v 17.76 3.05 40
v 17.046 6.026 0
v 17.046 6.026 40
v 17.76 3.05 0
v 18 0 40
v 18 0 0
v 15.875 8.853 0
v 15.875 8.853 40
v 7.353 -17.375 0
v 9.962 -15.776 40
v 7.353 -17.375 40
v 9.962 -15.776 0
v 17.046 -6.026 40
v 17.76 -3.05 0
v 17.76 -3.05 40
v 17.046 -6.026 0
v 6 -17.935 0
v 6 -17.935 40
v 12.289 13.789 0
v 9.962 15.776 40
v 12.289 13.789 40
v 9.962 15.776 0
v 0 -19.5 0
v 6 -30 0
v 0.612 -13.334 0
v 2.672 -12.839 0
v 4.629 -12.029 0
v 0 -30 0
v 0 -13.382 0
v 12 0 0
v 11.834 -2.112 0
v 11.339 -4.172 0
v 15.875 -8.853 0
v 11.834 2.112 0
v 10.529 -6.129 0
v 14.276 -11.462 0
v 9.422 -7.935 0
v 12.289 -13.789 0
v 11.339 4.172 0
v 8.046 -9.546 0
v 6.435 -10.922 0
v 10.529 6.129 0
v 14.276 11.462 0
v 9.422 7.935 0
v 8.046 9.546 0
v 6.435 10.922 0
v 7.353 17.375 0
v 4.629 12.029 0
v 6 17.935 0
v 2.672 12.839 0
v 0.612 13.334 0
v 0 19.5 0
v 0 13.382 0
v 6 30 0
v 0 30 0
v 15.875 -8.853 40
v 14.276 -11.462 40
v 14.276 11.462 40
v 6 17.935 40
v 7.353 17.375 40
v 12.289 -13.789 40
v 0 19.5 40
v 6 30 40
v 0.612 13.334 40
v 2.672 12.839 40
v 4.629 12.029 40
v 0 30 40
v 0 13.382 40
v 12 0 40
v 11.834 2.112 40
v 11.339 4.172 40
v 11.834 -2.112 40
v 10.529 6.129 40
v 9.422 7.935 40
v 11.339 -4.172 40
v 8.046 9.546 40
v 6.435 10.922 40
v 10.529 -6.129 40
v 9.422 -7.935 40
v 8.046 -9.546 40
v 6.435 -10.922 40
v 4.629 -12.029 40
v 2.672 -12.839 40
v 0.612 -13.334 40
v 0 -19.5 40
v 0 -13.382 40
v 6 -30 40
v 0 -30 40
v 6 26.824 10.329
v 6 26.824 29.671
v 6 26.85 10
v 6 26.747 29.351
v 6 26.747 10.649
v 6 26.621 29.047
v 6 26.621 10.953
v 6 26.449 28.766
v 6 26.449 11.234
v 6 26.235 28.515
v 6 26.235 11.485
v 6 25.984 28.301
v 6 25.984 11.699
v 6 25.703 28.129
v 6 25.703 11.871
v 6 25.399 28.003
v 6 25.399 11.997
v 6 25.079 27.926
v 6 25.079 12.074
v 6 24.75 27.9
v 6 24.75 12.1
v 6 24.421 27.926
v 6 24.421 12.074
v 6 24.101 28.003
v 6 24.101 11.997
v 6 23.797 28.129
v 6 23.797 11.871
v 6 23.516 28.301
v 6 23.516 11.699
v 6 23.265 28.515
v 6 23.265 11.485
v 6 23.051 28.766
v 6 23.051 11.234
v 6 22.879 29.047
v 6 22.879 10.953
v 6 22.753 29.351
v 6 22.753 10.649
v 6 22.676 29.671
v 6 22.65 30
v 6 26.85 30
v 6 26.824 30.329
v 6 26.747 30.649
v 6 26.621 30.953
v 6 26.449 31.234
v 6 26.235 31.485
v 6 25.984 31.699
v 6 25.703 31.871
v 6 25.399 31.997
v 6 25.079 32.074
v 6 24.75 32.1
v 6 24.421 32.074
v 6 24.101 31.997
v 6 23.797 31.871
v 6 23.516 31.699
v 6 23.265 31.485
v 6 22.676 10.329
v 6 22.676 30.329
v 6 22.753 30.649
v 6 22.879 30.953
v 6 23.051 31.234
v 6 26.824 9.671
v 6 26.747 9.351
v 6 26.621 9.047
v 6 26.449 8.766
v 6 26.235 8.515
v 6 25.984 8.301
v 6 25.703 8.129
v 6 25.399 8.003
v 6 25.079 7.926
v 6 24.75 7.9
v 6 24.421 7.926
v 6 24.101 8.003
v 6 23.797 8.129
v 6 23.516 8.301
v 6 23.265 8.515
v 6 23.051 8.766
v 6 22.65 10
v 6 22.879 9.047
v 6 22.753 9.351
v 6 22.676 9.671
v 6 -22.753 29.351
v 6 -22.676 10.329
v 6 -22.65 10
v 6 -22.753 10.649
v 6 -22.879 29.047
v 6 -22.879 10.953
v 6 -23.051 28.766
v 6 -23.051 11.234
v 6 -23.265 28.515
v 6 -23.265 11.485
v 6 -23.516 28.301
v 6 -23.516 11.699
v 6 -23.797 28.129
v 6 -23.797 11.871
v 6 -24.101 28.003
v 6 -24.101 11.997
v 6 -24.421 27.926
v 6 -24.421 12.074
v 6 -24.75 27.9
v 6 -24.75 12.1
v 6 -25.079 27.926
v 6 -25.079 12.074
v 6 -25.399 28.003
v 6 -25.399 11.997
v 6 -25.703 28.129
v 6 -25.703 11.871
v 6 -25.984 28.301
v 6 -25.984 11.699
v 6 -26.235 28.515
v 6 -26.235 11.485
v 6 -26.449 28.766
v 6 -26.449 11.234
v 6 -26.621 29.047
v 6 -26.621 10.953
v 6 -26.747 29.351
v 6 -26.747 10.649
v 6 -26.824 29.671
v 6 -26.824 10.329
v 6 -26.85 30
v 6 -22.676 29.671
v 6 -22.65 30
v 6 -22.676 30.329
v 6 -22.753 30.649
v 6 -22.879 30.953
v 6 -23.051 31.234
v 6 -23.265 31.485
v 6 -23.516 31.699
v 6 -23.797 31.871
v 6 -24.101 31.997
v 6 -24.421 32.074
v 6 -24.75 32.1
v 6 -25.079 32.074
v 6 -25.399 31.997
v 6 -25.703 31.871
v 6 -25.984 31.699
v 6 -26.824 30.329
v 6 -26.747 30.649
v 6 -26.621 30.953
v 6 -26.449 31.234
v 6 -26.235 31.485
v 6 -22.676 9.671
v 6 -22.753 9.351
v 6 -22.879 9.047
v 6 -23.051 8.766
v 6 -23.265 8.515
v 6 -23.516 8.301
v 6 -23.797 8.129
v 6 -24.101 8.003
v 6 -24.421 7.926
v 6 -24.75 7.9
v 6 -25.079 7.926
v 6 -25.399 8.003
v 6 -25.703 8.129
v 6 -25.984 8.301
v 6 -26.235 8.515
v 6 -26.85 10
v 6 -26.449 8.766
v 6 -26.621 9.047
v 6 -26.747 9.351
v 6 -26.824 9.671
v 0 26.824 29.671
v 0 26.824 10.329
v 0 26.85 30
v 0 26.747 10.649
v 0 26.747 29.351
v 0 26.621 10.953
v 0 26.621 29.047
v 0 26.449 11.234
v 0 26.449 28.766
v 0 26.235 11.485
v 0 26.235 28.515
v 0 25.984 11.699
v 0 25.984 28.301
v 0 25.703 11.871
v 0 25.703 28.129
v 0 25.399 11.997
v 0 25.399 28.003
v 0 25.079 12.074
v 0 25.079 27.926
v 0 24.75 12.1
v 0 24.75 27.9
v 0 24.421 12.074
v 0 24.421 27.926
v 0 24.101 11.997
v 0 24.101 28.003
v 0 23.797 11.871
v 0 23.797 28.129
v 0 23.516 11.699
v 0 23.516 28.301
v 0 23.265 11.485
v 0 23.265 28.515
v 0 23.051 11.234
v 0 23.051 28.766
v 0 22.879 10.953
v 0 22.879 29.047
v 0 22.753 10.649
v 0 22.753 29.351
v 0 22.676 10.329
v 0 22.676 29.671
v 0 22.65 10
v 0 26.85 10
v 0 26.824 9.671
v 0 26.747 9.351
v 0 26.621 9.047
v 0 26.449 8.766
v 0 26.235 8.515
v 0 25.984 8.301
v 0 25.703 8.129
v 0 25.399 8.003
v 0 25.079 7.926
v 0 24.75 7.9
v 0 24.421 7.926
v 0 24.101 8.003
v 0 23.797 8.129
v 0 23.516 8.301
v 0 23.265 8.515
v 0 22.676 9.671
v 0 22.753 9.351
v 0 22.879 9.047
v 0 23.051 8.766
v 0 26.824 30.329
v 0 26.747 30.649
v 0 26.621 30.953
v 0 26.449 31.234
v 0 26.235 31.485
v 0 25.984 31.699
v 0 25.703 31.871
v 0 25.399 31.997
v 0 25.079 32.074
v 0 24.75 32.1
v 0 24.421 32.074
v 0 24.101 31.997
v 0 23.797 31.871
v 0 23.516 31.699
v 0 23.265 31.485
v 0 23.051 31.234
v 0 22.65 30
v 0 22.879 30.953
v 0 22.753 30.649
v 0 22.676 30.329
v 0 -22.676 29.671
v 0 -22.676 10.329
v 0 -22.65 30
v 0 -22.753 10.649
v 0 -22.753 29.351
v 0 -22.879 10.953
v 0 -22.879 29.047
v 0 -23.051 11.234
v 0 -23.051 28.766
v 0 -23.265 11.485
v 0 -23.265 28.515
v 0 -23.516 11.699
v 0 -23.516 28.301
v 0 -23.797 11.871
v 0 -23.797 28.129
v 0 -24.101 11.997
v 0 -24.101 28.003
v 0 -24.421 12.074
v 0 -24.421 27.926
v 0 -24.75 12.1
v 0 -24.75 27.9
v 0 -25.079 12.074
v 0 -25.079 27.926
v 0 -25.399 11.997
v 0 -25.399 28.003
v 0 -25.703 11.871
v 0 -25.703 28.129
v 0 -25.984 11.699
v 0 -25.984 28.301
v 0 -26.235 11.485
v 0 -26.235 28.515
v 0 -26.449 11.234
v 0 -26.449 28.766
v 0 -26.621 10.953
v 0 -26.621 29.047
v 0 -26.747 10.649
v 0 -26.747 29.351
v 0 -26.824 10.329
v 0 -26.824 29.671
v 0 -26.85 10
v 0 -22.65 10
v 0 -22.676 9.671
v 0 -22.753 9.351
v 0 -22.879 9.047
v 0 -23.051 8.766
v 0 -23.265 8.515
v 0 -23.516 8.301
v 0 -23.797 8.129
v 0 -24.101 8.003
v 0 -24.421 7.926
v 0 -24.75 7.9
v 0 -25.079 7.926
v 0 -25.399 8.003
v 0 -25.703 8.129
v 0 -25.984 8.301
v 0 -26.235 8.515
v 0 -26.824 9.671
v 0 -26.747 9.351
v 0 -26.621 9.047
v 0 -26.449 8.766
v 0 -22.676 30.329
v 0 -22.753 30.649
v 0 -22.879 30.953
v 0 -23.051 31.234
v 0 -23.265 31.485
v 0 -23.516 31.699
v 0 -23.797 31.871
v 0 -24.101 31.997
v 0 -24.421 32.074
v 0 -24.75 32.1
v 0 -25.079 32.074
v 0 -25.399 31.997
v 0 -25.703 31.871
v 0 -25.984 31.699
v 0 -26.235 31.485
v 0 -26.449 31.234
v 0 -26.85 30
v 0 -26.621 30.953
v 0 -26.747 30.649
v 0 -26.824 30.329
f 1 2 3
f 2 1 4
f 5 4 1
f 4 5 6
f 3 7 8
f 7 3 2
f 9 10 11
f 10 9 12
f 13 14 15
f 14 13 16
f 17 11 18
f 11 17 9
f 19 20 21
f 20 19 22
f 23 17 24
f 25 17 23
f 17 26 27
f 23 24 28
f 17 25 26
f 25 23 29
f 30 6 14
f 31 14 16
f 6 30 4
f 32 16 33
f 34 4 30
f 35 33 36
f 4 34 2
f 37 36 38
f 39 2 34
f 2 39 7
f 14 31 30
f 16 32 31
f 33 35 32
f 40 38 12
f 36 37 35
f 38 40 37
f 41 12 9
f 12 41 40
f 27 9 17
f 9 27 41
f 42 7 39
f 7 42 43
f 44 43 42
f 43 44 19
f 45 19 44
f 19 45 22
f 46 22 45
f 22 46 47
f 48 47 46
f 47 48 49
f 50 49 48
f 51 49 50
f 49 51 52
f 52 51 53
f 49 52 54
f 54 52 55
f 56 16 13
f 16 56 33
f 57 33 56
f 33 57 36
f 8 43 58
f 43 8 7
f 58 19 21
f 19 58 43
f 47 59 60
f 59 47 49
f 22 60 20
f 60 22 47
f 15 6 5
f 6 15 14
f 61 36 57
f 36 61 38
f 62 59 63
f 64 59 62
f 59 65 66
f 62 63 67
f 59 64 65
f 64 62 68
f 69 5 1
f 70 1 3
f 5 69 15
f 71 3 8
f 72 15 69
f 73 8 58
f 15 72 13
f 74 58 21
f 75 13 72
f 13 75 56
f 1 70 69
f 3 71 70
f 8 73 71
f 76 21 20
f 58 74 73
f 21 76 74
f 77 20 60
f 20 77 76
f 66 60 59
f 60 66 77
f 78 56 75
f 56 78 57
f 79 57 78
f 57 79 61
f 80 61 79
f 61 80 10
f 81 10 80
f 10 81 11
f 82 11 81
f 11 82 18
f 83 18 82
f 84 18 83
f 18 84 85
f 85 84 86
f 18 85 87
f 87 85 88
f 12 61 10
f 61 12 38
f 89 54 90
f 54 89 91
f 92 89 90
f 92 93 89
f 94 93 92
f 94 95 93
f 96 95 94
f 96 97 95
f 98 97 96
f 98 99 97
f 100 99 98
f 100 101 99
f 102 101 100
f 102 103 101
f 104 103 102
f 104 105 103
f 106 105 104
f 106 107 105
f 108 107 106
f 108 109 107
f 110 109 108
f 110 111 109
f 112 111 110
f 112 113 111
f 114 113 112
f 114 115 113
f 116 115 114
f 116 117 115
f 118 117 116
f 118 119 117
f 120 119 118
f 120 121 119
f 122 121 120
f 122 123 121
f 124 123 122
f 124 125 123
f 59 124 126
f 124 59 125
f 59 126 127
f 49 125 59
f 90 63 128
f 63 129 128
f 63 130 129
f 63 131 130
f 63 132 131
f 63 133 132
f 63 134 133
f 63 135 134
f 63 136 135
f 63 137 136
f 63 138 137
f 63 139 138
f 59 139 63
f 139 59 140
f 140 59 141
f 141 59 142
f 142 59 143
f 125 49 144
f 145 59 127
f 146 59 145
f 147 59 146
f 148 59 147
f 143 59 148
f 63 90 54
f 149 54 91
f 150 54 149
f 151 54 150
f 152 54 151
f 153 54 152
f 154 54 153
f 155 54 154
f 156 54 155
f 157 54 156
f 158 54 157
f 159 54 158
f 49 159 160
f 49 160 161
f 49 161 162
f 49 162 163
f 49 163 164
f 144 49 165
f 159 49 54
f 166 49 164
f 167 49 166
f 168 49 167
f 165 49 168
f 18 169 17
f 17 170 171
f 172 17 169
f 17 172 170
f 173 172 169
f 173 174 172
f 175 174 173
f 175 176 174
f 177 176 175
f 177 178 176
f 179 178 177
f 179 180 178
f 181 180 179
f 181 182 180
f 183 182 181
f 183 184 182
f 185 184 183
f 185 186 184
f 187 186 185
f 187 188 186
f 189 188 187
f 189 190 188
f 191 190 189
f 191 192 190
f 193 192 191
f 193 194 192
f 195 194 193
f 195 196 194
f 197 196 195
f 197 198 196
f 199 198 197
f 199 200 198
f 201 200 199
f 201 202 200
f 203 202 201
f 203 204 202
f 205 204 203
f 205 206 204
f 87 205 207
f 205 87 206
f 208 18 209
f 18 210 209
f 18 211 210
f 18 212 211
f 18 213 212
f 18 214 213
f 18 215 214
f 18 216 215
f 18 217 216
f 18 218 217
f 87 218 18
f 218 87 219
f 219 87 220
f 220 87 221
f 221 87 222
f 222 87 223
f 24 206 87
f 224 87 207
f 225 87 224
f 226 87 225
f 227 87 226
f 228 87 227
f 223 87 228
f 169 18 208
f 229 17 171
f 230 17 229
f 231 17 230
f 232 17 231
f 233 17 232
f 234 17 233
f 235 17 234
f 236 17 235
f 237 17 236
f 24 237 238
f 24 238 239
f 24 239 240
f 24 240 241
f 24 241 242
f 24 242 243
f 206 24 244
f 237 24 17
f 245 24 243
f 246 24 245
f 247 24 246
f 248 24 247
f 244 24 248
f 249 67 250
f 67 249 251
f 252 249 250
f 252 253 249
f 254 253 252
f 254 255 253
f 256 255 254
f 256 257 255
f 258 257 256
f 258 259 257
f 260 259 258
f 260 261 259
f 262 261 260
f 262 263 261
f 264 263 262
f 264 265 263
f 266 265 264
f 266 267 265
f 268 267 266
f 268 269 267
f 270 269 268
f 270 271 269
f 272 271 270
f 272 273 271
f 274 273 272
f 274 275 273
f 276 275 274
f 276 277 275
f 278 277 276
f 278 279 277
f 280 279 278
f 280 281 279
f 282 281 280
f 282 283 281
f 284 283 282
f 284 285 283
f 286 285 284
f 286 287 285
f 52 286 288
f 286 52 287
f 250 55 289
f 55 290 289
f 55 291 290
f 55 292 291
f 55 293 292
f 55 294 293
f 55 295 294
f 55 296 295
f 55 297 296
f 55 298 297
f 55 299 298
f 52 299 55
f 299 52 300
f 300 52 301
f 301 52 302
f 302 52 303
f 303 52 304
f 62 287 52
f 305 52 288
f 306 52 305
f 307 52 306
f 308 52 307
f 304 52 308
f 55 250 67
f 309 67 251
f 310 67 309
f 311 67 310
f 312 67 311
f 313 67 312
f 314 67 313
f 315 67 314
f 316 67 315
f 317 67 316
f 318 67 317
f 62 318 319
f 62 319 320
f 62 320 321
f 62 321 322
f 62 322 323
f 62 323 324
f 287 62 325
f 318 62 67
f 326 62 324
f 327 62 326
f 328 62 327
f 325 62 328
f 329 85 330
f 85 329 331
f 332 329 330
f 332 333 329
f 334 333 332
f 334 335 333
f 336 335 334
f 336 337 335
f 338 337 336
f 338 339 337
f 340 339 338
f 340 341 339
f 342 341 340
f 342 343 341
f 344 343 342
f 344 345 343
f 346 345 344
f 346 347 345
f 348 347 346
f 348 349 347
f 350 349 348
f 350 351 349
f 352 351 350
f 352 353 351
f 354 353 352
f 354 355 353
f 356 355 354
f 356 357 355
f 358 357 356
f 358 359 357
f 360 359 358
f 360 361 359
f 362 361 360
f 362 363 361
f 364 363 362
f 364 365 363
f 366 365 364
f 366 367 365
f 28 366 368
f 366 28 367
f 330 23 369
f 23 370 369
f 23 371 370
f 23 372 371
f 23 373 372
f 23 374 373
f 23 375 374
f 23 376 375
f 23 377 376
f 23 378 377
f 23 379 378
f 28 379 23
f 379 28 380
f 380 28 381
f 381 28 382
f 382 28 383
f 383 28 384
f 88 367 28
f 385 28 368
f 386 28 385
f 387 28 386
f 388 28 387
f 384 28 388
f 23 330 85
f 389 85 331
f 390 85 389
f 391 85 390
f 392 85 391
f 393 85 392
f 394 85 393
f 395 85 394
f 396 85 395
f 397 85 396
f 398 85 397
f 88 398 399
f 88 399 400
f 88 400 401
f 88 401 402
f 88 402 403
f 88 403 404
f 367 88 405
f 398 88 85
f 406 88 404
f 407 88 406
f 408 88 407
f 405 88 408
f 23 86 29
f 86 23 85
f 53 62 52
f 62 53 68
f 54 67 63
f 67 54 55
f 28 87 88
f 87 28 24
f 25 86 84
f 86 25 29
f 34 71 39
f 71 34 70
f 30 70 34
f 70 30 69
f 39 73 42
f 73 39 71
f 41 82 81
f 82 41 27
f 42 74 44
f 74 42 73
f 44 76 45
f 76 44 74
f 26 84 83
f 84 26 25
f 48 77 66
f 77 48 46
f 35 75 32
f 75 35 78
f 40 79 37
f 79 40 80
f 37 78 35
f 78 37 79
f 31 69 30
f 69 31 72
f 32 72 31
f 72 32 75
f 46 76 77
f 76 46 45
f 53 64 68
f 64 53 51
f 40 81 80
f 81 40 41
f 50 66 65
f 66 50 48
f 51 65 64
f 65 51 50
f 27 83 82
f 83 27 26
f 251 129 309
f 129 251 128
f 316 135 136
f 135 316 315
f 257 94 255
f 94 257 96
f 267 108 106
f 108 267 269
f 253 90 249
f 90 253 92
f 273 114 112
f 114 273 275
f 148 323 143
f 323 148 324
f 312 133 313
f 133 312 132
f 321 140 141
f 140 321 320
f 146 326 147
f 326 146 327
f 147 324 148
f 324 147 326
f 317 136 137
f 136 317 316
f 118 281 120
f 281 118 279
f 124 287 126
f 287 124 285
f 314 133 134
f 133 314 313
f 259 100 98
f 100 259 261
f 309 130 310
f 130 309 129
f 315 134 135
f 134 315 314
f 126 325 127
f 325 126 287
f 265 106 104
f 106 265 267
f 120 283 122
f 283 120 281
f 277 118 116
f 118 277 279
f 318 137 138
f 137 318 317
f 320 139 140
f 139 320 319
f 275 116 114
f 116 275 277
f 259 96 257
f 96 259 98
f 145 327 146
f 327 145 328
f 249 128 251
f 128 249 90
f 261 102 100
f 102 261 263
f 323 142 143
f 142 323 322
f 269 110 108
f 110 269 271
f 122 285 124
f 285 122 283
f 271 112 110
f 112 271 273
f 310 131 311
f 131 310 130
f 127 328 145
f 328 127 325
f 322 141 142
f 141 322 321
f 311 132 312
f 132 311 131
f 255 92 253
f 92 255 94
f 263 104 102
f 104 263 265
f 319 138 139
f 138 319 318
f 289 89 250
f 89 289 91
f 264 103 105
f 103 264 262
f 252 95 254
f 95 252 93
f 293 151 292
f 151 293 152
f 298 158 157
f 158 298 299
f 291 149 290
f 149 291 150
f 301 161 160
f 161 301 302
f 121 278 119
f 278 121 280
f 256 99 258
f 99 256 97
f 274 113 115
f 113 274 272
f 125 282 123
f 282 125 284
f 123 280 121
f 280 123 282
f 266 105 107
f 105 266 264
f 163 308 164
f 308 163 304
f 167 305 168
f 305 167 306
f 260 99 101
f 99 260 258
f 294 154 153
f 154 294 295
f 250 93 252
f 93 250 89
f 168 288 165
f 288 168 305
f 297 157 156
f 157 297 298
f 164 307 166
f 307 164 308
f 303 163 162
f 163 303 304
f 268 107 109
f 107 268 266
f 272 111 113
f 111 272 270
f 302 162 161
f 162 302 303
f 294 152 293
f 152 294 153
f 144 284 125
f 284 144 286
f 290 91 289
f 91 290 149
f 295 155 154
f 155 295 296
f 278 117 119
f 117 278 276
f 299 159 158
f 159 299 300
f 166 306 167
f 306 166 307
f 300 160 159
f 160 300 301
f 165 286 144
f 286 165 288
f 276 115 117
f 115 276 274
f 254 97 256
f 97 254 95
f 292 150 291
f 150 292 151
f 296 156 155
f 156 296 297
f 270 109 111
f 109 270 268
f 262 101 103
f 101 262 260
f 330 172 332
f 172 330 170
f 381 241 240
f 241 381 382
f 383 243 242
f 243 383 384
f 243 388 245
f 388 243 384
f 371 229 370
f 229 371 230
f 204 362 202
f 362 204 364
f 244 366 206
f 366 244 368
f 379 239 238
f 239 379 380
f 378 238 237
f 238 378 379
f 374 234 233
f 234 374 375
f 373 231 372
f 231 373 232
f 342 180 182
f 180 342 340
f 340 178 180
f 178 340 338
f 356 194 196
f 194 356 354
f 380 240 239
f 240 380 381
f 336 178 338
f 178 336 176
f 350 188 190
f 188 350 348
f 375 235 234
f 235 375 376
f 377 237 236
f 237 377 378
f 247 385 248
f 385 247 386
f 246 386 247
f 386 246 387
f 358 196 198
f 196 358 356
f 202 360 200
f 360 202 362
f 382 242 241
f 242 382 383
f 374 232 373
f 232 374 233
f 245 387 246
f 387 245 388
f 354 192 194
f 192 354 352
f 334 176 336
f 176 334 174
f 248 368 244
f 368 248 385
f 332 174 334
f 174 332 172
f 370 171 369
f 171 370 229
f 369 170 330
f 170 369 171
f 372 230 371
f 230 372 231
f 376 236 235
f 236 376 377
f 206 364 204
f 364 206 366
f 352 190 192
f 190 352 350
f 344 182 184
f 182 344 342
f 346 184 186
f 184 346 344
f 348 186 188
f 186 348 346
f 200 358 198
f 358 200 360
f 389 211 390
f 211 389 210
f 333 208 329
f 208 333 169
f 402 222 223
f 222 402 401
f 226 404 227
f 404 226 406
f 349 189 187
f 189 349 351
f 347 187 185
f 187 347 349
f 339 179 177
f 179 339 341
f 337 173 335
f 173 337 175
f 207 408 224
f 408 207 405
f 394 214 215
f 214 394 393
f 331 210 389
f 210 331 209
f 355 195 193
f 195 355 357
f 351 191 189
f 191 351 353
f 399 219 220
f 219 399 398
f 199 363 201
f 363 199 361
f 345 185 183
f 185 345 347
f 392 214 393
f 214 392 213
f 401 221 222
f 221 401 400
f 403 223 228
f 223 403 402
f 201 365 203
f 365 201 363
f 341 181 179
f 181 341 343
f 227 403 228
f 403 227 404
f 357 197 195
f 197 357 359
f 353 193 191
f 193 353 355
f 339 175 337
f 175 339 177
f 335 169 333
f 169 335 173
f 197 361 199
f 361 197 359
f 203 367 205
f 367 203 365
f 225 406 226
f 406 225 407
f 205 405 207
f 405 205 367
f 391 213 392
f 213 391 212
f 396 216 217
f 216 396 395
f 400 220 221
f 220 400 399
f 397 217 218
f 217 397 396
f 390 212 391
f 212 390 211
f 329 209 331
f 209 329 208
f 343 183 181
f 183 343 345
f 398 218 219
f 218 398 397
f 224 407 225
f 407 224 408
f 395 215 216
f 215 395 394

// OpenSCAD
// file: ../src/AWSCREEN01A_D06.scad
$fn=40; // model faces resolution.
include <../configuration.scad>


module AWSCREEN01A_D06(){
	
		difference()
    {
    union()
        {
        //základní válec
        cylinder(h=D02_vyska_uchytky,r=(D02_prumer_obruby+2*D02_sila_materialu)/2,center=true);
		//úchytové plošky		
        translate([D02_dotahova_vzdalenost+D02_sila_materialu/2,0,0]){cube([D02_sila_materialu,D02_delka_celeho_uchytu,D02_vyska_uchytky],center=true);}
		}
    
    //válec na odečet
    cylinder(h=D02_vyska_uchytky+0.01,r=D02_prumer_obruby/2,center=true);     
	        
    //kvádr na odecet
	translate([D02_dotahova_vzdalenost-(D02_prumer_obruby+2*D02_sila_materialu)/2,0,0]){cube([D02_prumer_obruby+2*D02_sila_materialu,D02_prumer_obruby+2*D02_sila_materialu,D02_vyska_uchytky+0.01],center=true);}
		
	//otvory na sroub
	translate([D02_dotahova_vzdalenost,(D02_delka_celeho_uchytu/2-D02_prumer_obruby/2-D02_sila_materialu)/2+D02_prumer_obruby/2+D02_sila_materialu,D02_vyska_uchytky/4]){rotate([0,90,0]){cylinder(h=D02_sila_materialu+0.01,r=D02_prumer_uchytneho_sroubu/2);}}
    
     //drzak matky
    translate([D02_dotahova_vzdalenost+D02_sila_materialu-D02_vyska_matky,(D02_delka_celeho_uchytu/2-D02_prumer_obruby/2-D02_sila_materialu)/2+D02_prumer_obruby/2+D02_sila_materialu,D02_vyska_uchytky/4]){rotate([0,90,0]){ cylinder (h = D02_vyska_matky+0.01, r= (D02_sirka_matky+0.2)/2, $fn=6);}}
   
     
        
    translate([D02_dotahova_vzdalenost,(D02_delka_celeho_uchytu/2-D02_prumer_obruby/2-D02_sila_materialu)/2+D02_prumer_obruby/2+D02_sila_materialu,-D02_vyska_uchytky/4]){rotate([0,90,0]){cylinder(h=D02_sila_materialu+0.01,r=D02_prumer_uchytneho_sroubu/2);}}
    
     //drzak matky
    translate([D02_dotahova_vzdalenost+D02_sila_materialu-D02_vyska_matky,(D02_delka_celeho_uchytu/2-D02_prumer_obruby/2-D02_sila_materialu)/2+D02_prumer_obruby/2+D02_sila_materialu,-D02_vyska_uchytky/4]){rotate([0,90,0]){ cylinder (h = D02_vyska_matky+0.01, r= (D02_sirka_matky+0.2)/2, $fn=6);}}
        
	translate([D02_dotahova_vzdalenost,-((D02_delka_celeho_uchytu/2-D02_prumer_obruby/2-D02_sila_materialu)/2+D02_prumer_obruby/2+D02_sila_materialu),-D02_vyska_uchytky/4]){rotate([0,90,0]){cylinder(h=D02_sila_materialu+0.01,r=D02_prumer_uchytneho_sroubu/2);}}
    
     //drzak matky
    translate([D02_dotahova_vzdalenost+D02_sila_materialu-D02_vyska_matky,-((D02_delka_celeho_uchytu/2-D02_prumer_obruby/2-D02_sila_materialu)/2+D02_prumer_obruby/2+D02_sila_materialu),-D02_vyska_uchytky/4]){rotate([0,90,0]){ cylinder (h = D02_vyska_matky+0.01, r= (D02_sirka_matky+0.2)/2, $fn=6);}}

    translate([D02_dotahova_vzdalenost,-((D02_delka_celeho_uchytu/2-D02_prumer_obruby/2-D02_sila_materialu)/2+D02_prumer_obruby/2+D02_sila_materialu),D02_vyska_uchytky/4]){rotate([0,90,0]){cylinder(h=D02_sila_materialu+0.01,r=D02_prumer_uchytneho_sroubu/2);}}	
    
     //drzak matky
    translate([D02_dotahova_vzdalenost+D02_sila_materialu-D02_vyska_matky,-((D02_delka_celeho_uchytu/2-D02_prumer_obruby/2-D02_sila_materialu)/2+D02_prumer_obruby/2+D02_sila_materialu),D02_vyska_uchytky/4]){rotate([0,90,0]){ cylinder (h = D02_vyska_matky+0.01, r= (D02_sirka_matky+0.2)/2, $fn=6);}}
	
    }
}

module AWSCREEN01A_D06_2(){
	
difference()
    {
    union()
        {
        //základní válec
        cylinder(h=D02_vyska_uchytky,r=(D02_prumer_obruby+2*D02_sila_materialu)/2,center=true);
		//úchytové plošky		
        translate([D02_dotahova_vzdalenost+D02_sila_materialu/2,0,0]){cube([D02_sila_materialu,D02_delka_celeho_uchytu,D02_vyska_uchytky],center=true);}
		}
    
    //válec na odečet
    cylinder(h=D02_vyska_uchytky+0.01,r=D02_prumer_obruby/2,center=true);     
	        
    //kvádr na odecet
	translate([D02_dotahova_vzdalenost-(D02_prumer_obruby+2*D02_sila_materialu)/2,0,0]){cube([D02_prumer_obruby+2*D02_sila_materialu,D02_prumer_obruby+2*D02_sila_materialu,D02_vyska_uchytky+0.01],center=true);}
		
	//otvory na sroub
	translate([D02_dotahova_vzdalenost,(D02_delka_celeho_uchytu/2-D02_prumer_obruby/2-D02_sila_materialu)/2+D02_prumer_obruby/2+D02_sila_materialu,D02_vyska_uchytky/4]){rotate([0,90,0]){cylinder(h=D02_sila_materialu+0.01,r=D02_prumer_uchytneho_sroubu/2);}}
    
    
   
     
        
    translate([D02_dotahova_vzdalenost,(D02_delka_celeho_uchytu/2-D02_prumer_obruby/2-D02_sila_materialu)/2+D02_prumer_obruby/2+D02_sila_materialu,-D02_vyska_uchytky/4]){rotate([0,90,0]){cylinder(h=D02_sila_materialu+0.01,r=D02_prumer_uchytneho_sroubu/2);}}
    
     
        
	translate([D02_dotahova_vzdalenost,-((D02_delka_celeho_uchytu/2-D02_prumer_obruby/2-D02_sila_materialu)/2+D02_prumer_obruby/2+D02_sila_materialu),-D02_vyska_uchytky/4]){rotate([0,90,0]){cylinder(h=D02_sila_materialu+0.01,r=D02_prumer_uchytneho_sroubu/2);}}
    
    

    translate([D02_dotahova_vzdalenost,-((D02_delka_celeho_uchytu/2-D02_prumer_obruby/2-D02_sila_materialu)/2+D02_prumer_obruby/2+D02_sila_materialu),D02_vyska_uchytky/4]){rotate([0,90,0]){cylinder(h=D02_sila_materialu+0.01,r=D02_prumer_uchytneho_sroubu/2);}}	
    
    
	
    }
}
// file: ../configuration.scad
$fn=40; // model faces resolution.

//OBECNE PARAMETRY 
//----------------------------------------------------------------
//----------------------------------------------------------------


//AWSCREEN01A_D03 -stredni díl
D03_vyska_zavitu=5;
D03_tolerance_zavitu=0.75; //tolerance s poloměru
D03_material_za_zavitem=2;
D03_material_za_zavitem_pridani=1.5; //tímto se pridává materiál za horním závitem 
D03_polomer_zavitu=32.5;
D03_polomer_stitu=47.5;
D03_tloustka_materialu=1.8;
D03_vyska_stitu=20;
D03_pocet_vyztuh=3;
screen_bevel = 20;
PI=3.141592;

//AWSCREEN01A_D04
D04_sila_materialu_na_konektor=3;
D04_konenektor_x=12.3;
D04_konenektor_y=19;
D04_konenektor_z=5; //vyska krytu
D04_vyska_drzaku_senzoru=28;


//AWSCREEN01A_D05 //uchyt velky
D01_material_pod_zavitem=5;
D01_material_za_zavitem=3;
D01_material_pred_zavitem=2;
D01_delka_tyce=50;
D01_sirka_tyce=10;
S01_vyska_komponentu_na_lozisko=D03_vyska_zavitu;
S01_prumer_zavitu=2*D03_polomer_zavitu;


//AWSCREEN01A_D06 //uchyt na sloup
D02_sila_materialu=6;
D02_vyska_uchytky=40;
D02_prumer_obruby=27; 

//27 mm - 3/4 trubka
D02_delka_celeho_uchytu=60;
D02_dotahova_vzdalenost=1.5;
D02_prumer_uchytneho_sroubu=4.2;
D02_sirka_matky=9.1; //pro M4
D02_vyska_matky=3;
// main file
$fn=100; // model faces resolution.
include <../configuration.scad>
use <../src/AWSCREEN01A_D06.scad>

rotate([0, 0, 0])
translate([-D02_dotahova_vzdalenost,0,D02_vyska_uchytky/2])

AWSCREEN01A_D06_2();

            
